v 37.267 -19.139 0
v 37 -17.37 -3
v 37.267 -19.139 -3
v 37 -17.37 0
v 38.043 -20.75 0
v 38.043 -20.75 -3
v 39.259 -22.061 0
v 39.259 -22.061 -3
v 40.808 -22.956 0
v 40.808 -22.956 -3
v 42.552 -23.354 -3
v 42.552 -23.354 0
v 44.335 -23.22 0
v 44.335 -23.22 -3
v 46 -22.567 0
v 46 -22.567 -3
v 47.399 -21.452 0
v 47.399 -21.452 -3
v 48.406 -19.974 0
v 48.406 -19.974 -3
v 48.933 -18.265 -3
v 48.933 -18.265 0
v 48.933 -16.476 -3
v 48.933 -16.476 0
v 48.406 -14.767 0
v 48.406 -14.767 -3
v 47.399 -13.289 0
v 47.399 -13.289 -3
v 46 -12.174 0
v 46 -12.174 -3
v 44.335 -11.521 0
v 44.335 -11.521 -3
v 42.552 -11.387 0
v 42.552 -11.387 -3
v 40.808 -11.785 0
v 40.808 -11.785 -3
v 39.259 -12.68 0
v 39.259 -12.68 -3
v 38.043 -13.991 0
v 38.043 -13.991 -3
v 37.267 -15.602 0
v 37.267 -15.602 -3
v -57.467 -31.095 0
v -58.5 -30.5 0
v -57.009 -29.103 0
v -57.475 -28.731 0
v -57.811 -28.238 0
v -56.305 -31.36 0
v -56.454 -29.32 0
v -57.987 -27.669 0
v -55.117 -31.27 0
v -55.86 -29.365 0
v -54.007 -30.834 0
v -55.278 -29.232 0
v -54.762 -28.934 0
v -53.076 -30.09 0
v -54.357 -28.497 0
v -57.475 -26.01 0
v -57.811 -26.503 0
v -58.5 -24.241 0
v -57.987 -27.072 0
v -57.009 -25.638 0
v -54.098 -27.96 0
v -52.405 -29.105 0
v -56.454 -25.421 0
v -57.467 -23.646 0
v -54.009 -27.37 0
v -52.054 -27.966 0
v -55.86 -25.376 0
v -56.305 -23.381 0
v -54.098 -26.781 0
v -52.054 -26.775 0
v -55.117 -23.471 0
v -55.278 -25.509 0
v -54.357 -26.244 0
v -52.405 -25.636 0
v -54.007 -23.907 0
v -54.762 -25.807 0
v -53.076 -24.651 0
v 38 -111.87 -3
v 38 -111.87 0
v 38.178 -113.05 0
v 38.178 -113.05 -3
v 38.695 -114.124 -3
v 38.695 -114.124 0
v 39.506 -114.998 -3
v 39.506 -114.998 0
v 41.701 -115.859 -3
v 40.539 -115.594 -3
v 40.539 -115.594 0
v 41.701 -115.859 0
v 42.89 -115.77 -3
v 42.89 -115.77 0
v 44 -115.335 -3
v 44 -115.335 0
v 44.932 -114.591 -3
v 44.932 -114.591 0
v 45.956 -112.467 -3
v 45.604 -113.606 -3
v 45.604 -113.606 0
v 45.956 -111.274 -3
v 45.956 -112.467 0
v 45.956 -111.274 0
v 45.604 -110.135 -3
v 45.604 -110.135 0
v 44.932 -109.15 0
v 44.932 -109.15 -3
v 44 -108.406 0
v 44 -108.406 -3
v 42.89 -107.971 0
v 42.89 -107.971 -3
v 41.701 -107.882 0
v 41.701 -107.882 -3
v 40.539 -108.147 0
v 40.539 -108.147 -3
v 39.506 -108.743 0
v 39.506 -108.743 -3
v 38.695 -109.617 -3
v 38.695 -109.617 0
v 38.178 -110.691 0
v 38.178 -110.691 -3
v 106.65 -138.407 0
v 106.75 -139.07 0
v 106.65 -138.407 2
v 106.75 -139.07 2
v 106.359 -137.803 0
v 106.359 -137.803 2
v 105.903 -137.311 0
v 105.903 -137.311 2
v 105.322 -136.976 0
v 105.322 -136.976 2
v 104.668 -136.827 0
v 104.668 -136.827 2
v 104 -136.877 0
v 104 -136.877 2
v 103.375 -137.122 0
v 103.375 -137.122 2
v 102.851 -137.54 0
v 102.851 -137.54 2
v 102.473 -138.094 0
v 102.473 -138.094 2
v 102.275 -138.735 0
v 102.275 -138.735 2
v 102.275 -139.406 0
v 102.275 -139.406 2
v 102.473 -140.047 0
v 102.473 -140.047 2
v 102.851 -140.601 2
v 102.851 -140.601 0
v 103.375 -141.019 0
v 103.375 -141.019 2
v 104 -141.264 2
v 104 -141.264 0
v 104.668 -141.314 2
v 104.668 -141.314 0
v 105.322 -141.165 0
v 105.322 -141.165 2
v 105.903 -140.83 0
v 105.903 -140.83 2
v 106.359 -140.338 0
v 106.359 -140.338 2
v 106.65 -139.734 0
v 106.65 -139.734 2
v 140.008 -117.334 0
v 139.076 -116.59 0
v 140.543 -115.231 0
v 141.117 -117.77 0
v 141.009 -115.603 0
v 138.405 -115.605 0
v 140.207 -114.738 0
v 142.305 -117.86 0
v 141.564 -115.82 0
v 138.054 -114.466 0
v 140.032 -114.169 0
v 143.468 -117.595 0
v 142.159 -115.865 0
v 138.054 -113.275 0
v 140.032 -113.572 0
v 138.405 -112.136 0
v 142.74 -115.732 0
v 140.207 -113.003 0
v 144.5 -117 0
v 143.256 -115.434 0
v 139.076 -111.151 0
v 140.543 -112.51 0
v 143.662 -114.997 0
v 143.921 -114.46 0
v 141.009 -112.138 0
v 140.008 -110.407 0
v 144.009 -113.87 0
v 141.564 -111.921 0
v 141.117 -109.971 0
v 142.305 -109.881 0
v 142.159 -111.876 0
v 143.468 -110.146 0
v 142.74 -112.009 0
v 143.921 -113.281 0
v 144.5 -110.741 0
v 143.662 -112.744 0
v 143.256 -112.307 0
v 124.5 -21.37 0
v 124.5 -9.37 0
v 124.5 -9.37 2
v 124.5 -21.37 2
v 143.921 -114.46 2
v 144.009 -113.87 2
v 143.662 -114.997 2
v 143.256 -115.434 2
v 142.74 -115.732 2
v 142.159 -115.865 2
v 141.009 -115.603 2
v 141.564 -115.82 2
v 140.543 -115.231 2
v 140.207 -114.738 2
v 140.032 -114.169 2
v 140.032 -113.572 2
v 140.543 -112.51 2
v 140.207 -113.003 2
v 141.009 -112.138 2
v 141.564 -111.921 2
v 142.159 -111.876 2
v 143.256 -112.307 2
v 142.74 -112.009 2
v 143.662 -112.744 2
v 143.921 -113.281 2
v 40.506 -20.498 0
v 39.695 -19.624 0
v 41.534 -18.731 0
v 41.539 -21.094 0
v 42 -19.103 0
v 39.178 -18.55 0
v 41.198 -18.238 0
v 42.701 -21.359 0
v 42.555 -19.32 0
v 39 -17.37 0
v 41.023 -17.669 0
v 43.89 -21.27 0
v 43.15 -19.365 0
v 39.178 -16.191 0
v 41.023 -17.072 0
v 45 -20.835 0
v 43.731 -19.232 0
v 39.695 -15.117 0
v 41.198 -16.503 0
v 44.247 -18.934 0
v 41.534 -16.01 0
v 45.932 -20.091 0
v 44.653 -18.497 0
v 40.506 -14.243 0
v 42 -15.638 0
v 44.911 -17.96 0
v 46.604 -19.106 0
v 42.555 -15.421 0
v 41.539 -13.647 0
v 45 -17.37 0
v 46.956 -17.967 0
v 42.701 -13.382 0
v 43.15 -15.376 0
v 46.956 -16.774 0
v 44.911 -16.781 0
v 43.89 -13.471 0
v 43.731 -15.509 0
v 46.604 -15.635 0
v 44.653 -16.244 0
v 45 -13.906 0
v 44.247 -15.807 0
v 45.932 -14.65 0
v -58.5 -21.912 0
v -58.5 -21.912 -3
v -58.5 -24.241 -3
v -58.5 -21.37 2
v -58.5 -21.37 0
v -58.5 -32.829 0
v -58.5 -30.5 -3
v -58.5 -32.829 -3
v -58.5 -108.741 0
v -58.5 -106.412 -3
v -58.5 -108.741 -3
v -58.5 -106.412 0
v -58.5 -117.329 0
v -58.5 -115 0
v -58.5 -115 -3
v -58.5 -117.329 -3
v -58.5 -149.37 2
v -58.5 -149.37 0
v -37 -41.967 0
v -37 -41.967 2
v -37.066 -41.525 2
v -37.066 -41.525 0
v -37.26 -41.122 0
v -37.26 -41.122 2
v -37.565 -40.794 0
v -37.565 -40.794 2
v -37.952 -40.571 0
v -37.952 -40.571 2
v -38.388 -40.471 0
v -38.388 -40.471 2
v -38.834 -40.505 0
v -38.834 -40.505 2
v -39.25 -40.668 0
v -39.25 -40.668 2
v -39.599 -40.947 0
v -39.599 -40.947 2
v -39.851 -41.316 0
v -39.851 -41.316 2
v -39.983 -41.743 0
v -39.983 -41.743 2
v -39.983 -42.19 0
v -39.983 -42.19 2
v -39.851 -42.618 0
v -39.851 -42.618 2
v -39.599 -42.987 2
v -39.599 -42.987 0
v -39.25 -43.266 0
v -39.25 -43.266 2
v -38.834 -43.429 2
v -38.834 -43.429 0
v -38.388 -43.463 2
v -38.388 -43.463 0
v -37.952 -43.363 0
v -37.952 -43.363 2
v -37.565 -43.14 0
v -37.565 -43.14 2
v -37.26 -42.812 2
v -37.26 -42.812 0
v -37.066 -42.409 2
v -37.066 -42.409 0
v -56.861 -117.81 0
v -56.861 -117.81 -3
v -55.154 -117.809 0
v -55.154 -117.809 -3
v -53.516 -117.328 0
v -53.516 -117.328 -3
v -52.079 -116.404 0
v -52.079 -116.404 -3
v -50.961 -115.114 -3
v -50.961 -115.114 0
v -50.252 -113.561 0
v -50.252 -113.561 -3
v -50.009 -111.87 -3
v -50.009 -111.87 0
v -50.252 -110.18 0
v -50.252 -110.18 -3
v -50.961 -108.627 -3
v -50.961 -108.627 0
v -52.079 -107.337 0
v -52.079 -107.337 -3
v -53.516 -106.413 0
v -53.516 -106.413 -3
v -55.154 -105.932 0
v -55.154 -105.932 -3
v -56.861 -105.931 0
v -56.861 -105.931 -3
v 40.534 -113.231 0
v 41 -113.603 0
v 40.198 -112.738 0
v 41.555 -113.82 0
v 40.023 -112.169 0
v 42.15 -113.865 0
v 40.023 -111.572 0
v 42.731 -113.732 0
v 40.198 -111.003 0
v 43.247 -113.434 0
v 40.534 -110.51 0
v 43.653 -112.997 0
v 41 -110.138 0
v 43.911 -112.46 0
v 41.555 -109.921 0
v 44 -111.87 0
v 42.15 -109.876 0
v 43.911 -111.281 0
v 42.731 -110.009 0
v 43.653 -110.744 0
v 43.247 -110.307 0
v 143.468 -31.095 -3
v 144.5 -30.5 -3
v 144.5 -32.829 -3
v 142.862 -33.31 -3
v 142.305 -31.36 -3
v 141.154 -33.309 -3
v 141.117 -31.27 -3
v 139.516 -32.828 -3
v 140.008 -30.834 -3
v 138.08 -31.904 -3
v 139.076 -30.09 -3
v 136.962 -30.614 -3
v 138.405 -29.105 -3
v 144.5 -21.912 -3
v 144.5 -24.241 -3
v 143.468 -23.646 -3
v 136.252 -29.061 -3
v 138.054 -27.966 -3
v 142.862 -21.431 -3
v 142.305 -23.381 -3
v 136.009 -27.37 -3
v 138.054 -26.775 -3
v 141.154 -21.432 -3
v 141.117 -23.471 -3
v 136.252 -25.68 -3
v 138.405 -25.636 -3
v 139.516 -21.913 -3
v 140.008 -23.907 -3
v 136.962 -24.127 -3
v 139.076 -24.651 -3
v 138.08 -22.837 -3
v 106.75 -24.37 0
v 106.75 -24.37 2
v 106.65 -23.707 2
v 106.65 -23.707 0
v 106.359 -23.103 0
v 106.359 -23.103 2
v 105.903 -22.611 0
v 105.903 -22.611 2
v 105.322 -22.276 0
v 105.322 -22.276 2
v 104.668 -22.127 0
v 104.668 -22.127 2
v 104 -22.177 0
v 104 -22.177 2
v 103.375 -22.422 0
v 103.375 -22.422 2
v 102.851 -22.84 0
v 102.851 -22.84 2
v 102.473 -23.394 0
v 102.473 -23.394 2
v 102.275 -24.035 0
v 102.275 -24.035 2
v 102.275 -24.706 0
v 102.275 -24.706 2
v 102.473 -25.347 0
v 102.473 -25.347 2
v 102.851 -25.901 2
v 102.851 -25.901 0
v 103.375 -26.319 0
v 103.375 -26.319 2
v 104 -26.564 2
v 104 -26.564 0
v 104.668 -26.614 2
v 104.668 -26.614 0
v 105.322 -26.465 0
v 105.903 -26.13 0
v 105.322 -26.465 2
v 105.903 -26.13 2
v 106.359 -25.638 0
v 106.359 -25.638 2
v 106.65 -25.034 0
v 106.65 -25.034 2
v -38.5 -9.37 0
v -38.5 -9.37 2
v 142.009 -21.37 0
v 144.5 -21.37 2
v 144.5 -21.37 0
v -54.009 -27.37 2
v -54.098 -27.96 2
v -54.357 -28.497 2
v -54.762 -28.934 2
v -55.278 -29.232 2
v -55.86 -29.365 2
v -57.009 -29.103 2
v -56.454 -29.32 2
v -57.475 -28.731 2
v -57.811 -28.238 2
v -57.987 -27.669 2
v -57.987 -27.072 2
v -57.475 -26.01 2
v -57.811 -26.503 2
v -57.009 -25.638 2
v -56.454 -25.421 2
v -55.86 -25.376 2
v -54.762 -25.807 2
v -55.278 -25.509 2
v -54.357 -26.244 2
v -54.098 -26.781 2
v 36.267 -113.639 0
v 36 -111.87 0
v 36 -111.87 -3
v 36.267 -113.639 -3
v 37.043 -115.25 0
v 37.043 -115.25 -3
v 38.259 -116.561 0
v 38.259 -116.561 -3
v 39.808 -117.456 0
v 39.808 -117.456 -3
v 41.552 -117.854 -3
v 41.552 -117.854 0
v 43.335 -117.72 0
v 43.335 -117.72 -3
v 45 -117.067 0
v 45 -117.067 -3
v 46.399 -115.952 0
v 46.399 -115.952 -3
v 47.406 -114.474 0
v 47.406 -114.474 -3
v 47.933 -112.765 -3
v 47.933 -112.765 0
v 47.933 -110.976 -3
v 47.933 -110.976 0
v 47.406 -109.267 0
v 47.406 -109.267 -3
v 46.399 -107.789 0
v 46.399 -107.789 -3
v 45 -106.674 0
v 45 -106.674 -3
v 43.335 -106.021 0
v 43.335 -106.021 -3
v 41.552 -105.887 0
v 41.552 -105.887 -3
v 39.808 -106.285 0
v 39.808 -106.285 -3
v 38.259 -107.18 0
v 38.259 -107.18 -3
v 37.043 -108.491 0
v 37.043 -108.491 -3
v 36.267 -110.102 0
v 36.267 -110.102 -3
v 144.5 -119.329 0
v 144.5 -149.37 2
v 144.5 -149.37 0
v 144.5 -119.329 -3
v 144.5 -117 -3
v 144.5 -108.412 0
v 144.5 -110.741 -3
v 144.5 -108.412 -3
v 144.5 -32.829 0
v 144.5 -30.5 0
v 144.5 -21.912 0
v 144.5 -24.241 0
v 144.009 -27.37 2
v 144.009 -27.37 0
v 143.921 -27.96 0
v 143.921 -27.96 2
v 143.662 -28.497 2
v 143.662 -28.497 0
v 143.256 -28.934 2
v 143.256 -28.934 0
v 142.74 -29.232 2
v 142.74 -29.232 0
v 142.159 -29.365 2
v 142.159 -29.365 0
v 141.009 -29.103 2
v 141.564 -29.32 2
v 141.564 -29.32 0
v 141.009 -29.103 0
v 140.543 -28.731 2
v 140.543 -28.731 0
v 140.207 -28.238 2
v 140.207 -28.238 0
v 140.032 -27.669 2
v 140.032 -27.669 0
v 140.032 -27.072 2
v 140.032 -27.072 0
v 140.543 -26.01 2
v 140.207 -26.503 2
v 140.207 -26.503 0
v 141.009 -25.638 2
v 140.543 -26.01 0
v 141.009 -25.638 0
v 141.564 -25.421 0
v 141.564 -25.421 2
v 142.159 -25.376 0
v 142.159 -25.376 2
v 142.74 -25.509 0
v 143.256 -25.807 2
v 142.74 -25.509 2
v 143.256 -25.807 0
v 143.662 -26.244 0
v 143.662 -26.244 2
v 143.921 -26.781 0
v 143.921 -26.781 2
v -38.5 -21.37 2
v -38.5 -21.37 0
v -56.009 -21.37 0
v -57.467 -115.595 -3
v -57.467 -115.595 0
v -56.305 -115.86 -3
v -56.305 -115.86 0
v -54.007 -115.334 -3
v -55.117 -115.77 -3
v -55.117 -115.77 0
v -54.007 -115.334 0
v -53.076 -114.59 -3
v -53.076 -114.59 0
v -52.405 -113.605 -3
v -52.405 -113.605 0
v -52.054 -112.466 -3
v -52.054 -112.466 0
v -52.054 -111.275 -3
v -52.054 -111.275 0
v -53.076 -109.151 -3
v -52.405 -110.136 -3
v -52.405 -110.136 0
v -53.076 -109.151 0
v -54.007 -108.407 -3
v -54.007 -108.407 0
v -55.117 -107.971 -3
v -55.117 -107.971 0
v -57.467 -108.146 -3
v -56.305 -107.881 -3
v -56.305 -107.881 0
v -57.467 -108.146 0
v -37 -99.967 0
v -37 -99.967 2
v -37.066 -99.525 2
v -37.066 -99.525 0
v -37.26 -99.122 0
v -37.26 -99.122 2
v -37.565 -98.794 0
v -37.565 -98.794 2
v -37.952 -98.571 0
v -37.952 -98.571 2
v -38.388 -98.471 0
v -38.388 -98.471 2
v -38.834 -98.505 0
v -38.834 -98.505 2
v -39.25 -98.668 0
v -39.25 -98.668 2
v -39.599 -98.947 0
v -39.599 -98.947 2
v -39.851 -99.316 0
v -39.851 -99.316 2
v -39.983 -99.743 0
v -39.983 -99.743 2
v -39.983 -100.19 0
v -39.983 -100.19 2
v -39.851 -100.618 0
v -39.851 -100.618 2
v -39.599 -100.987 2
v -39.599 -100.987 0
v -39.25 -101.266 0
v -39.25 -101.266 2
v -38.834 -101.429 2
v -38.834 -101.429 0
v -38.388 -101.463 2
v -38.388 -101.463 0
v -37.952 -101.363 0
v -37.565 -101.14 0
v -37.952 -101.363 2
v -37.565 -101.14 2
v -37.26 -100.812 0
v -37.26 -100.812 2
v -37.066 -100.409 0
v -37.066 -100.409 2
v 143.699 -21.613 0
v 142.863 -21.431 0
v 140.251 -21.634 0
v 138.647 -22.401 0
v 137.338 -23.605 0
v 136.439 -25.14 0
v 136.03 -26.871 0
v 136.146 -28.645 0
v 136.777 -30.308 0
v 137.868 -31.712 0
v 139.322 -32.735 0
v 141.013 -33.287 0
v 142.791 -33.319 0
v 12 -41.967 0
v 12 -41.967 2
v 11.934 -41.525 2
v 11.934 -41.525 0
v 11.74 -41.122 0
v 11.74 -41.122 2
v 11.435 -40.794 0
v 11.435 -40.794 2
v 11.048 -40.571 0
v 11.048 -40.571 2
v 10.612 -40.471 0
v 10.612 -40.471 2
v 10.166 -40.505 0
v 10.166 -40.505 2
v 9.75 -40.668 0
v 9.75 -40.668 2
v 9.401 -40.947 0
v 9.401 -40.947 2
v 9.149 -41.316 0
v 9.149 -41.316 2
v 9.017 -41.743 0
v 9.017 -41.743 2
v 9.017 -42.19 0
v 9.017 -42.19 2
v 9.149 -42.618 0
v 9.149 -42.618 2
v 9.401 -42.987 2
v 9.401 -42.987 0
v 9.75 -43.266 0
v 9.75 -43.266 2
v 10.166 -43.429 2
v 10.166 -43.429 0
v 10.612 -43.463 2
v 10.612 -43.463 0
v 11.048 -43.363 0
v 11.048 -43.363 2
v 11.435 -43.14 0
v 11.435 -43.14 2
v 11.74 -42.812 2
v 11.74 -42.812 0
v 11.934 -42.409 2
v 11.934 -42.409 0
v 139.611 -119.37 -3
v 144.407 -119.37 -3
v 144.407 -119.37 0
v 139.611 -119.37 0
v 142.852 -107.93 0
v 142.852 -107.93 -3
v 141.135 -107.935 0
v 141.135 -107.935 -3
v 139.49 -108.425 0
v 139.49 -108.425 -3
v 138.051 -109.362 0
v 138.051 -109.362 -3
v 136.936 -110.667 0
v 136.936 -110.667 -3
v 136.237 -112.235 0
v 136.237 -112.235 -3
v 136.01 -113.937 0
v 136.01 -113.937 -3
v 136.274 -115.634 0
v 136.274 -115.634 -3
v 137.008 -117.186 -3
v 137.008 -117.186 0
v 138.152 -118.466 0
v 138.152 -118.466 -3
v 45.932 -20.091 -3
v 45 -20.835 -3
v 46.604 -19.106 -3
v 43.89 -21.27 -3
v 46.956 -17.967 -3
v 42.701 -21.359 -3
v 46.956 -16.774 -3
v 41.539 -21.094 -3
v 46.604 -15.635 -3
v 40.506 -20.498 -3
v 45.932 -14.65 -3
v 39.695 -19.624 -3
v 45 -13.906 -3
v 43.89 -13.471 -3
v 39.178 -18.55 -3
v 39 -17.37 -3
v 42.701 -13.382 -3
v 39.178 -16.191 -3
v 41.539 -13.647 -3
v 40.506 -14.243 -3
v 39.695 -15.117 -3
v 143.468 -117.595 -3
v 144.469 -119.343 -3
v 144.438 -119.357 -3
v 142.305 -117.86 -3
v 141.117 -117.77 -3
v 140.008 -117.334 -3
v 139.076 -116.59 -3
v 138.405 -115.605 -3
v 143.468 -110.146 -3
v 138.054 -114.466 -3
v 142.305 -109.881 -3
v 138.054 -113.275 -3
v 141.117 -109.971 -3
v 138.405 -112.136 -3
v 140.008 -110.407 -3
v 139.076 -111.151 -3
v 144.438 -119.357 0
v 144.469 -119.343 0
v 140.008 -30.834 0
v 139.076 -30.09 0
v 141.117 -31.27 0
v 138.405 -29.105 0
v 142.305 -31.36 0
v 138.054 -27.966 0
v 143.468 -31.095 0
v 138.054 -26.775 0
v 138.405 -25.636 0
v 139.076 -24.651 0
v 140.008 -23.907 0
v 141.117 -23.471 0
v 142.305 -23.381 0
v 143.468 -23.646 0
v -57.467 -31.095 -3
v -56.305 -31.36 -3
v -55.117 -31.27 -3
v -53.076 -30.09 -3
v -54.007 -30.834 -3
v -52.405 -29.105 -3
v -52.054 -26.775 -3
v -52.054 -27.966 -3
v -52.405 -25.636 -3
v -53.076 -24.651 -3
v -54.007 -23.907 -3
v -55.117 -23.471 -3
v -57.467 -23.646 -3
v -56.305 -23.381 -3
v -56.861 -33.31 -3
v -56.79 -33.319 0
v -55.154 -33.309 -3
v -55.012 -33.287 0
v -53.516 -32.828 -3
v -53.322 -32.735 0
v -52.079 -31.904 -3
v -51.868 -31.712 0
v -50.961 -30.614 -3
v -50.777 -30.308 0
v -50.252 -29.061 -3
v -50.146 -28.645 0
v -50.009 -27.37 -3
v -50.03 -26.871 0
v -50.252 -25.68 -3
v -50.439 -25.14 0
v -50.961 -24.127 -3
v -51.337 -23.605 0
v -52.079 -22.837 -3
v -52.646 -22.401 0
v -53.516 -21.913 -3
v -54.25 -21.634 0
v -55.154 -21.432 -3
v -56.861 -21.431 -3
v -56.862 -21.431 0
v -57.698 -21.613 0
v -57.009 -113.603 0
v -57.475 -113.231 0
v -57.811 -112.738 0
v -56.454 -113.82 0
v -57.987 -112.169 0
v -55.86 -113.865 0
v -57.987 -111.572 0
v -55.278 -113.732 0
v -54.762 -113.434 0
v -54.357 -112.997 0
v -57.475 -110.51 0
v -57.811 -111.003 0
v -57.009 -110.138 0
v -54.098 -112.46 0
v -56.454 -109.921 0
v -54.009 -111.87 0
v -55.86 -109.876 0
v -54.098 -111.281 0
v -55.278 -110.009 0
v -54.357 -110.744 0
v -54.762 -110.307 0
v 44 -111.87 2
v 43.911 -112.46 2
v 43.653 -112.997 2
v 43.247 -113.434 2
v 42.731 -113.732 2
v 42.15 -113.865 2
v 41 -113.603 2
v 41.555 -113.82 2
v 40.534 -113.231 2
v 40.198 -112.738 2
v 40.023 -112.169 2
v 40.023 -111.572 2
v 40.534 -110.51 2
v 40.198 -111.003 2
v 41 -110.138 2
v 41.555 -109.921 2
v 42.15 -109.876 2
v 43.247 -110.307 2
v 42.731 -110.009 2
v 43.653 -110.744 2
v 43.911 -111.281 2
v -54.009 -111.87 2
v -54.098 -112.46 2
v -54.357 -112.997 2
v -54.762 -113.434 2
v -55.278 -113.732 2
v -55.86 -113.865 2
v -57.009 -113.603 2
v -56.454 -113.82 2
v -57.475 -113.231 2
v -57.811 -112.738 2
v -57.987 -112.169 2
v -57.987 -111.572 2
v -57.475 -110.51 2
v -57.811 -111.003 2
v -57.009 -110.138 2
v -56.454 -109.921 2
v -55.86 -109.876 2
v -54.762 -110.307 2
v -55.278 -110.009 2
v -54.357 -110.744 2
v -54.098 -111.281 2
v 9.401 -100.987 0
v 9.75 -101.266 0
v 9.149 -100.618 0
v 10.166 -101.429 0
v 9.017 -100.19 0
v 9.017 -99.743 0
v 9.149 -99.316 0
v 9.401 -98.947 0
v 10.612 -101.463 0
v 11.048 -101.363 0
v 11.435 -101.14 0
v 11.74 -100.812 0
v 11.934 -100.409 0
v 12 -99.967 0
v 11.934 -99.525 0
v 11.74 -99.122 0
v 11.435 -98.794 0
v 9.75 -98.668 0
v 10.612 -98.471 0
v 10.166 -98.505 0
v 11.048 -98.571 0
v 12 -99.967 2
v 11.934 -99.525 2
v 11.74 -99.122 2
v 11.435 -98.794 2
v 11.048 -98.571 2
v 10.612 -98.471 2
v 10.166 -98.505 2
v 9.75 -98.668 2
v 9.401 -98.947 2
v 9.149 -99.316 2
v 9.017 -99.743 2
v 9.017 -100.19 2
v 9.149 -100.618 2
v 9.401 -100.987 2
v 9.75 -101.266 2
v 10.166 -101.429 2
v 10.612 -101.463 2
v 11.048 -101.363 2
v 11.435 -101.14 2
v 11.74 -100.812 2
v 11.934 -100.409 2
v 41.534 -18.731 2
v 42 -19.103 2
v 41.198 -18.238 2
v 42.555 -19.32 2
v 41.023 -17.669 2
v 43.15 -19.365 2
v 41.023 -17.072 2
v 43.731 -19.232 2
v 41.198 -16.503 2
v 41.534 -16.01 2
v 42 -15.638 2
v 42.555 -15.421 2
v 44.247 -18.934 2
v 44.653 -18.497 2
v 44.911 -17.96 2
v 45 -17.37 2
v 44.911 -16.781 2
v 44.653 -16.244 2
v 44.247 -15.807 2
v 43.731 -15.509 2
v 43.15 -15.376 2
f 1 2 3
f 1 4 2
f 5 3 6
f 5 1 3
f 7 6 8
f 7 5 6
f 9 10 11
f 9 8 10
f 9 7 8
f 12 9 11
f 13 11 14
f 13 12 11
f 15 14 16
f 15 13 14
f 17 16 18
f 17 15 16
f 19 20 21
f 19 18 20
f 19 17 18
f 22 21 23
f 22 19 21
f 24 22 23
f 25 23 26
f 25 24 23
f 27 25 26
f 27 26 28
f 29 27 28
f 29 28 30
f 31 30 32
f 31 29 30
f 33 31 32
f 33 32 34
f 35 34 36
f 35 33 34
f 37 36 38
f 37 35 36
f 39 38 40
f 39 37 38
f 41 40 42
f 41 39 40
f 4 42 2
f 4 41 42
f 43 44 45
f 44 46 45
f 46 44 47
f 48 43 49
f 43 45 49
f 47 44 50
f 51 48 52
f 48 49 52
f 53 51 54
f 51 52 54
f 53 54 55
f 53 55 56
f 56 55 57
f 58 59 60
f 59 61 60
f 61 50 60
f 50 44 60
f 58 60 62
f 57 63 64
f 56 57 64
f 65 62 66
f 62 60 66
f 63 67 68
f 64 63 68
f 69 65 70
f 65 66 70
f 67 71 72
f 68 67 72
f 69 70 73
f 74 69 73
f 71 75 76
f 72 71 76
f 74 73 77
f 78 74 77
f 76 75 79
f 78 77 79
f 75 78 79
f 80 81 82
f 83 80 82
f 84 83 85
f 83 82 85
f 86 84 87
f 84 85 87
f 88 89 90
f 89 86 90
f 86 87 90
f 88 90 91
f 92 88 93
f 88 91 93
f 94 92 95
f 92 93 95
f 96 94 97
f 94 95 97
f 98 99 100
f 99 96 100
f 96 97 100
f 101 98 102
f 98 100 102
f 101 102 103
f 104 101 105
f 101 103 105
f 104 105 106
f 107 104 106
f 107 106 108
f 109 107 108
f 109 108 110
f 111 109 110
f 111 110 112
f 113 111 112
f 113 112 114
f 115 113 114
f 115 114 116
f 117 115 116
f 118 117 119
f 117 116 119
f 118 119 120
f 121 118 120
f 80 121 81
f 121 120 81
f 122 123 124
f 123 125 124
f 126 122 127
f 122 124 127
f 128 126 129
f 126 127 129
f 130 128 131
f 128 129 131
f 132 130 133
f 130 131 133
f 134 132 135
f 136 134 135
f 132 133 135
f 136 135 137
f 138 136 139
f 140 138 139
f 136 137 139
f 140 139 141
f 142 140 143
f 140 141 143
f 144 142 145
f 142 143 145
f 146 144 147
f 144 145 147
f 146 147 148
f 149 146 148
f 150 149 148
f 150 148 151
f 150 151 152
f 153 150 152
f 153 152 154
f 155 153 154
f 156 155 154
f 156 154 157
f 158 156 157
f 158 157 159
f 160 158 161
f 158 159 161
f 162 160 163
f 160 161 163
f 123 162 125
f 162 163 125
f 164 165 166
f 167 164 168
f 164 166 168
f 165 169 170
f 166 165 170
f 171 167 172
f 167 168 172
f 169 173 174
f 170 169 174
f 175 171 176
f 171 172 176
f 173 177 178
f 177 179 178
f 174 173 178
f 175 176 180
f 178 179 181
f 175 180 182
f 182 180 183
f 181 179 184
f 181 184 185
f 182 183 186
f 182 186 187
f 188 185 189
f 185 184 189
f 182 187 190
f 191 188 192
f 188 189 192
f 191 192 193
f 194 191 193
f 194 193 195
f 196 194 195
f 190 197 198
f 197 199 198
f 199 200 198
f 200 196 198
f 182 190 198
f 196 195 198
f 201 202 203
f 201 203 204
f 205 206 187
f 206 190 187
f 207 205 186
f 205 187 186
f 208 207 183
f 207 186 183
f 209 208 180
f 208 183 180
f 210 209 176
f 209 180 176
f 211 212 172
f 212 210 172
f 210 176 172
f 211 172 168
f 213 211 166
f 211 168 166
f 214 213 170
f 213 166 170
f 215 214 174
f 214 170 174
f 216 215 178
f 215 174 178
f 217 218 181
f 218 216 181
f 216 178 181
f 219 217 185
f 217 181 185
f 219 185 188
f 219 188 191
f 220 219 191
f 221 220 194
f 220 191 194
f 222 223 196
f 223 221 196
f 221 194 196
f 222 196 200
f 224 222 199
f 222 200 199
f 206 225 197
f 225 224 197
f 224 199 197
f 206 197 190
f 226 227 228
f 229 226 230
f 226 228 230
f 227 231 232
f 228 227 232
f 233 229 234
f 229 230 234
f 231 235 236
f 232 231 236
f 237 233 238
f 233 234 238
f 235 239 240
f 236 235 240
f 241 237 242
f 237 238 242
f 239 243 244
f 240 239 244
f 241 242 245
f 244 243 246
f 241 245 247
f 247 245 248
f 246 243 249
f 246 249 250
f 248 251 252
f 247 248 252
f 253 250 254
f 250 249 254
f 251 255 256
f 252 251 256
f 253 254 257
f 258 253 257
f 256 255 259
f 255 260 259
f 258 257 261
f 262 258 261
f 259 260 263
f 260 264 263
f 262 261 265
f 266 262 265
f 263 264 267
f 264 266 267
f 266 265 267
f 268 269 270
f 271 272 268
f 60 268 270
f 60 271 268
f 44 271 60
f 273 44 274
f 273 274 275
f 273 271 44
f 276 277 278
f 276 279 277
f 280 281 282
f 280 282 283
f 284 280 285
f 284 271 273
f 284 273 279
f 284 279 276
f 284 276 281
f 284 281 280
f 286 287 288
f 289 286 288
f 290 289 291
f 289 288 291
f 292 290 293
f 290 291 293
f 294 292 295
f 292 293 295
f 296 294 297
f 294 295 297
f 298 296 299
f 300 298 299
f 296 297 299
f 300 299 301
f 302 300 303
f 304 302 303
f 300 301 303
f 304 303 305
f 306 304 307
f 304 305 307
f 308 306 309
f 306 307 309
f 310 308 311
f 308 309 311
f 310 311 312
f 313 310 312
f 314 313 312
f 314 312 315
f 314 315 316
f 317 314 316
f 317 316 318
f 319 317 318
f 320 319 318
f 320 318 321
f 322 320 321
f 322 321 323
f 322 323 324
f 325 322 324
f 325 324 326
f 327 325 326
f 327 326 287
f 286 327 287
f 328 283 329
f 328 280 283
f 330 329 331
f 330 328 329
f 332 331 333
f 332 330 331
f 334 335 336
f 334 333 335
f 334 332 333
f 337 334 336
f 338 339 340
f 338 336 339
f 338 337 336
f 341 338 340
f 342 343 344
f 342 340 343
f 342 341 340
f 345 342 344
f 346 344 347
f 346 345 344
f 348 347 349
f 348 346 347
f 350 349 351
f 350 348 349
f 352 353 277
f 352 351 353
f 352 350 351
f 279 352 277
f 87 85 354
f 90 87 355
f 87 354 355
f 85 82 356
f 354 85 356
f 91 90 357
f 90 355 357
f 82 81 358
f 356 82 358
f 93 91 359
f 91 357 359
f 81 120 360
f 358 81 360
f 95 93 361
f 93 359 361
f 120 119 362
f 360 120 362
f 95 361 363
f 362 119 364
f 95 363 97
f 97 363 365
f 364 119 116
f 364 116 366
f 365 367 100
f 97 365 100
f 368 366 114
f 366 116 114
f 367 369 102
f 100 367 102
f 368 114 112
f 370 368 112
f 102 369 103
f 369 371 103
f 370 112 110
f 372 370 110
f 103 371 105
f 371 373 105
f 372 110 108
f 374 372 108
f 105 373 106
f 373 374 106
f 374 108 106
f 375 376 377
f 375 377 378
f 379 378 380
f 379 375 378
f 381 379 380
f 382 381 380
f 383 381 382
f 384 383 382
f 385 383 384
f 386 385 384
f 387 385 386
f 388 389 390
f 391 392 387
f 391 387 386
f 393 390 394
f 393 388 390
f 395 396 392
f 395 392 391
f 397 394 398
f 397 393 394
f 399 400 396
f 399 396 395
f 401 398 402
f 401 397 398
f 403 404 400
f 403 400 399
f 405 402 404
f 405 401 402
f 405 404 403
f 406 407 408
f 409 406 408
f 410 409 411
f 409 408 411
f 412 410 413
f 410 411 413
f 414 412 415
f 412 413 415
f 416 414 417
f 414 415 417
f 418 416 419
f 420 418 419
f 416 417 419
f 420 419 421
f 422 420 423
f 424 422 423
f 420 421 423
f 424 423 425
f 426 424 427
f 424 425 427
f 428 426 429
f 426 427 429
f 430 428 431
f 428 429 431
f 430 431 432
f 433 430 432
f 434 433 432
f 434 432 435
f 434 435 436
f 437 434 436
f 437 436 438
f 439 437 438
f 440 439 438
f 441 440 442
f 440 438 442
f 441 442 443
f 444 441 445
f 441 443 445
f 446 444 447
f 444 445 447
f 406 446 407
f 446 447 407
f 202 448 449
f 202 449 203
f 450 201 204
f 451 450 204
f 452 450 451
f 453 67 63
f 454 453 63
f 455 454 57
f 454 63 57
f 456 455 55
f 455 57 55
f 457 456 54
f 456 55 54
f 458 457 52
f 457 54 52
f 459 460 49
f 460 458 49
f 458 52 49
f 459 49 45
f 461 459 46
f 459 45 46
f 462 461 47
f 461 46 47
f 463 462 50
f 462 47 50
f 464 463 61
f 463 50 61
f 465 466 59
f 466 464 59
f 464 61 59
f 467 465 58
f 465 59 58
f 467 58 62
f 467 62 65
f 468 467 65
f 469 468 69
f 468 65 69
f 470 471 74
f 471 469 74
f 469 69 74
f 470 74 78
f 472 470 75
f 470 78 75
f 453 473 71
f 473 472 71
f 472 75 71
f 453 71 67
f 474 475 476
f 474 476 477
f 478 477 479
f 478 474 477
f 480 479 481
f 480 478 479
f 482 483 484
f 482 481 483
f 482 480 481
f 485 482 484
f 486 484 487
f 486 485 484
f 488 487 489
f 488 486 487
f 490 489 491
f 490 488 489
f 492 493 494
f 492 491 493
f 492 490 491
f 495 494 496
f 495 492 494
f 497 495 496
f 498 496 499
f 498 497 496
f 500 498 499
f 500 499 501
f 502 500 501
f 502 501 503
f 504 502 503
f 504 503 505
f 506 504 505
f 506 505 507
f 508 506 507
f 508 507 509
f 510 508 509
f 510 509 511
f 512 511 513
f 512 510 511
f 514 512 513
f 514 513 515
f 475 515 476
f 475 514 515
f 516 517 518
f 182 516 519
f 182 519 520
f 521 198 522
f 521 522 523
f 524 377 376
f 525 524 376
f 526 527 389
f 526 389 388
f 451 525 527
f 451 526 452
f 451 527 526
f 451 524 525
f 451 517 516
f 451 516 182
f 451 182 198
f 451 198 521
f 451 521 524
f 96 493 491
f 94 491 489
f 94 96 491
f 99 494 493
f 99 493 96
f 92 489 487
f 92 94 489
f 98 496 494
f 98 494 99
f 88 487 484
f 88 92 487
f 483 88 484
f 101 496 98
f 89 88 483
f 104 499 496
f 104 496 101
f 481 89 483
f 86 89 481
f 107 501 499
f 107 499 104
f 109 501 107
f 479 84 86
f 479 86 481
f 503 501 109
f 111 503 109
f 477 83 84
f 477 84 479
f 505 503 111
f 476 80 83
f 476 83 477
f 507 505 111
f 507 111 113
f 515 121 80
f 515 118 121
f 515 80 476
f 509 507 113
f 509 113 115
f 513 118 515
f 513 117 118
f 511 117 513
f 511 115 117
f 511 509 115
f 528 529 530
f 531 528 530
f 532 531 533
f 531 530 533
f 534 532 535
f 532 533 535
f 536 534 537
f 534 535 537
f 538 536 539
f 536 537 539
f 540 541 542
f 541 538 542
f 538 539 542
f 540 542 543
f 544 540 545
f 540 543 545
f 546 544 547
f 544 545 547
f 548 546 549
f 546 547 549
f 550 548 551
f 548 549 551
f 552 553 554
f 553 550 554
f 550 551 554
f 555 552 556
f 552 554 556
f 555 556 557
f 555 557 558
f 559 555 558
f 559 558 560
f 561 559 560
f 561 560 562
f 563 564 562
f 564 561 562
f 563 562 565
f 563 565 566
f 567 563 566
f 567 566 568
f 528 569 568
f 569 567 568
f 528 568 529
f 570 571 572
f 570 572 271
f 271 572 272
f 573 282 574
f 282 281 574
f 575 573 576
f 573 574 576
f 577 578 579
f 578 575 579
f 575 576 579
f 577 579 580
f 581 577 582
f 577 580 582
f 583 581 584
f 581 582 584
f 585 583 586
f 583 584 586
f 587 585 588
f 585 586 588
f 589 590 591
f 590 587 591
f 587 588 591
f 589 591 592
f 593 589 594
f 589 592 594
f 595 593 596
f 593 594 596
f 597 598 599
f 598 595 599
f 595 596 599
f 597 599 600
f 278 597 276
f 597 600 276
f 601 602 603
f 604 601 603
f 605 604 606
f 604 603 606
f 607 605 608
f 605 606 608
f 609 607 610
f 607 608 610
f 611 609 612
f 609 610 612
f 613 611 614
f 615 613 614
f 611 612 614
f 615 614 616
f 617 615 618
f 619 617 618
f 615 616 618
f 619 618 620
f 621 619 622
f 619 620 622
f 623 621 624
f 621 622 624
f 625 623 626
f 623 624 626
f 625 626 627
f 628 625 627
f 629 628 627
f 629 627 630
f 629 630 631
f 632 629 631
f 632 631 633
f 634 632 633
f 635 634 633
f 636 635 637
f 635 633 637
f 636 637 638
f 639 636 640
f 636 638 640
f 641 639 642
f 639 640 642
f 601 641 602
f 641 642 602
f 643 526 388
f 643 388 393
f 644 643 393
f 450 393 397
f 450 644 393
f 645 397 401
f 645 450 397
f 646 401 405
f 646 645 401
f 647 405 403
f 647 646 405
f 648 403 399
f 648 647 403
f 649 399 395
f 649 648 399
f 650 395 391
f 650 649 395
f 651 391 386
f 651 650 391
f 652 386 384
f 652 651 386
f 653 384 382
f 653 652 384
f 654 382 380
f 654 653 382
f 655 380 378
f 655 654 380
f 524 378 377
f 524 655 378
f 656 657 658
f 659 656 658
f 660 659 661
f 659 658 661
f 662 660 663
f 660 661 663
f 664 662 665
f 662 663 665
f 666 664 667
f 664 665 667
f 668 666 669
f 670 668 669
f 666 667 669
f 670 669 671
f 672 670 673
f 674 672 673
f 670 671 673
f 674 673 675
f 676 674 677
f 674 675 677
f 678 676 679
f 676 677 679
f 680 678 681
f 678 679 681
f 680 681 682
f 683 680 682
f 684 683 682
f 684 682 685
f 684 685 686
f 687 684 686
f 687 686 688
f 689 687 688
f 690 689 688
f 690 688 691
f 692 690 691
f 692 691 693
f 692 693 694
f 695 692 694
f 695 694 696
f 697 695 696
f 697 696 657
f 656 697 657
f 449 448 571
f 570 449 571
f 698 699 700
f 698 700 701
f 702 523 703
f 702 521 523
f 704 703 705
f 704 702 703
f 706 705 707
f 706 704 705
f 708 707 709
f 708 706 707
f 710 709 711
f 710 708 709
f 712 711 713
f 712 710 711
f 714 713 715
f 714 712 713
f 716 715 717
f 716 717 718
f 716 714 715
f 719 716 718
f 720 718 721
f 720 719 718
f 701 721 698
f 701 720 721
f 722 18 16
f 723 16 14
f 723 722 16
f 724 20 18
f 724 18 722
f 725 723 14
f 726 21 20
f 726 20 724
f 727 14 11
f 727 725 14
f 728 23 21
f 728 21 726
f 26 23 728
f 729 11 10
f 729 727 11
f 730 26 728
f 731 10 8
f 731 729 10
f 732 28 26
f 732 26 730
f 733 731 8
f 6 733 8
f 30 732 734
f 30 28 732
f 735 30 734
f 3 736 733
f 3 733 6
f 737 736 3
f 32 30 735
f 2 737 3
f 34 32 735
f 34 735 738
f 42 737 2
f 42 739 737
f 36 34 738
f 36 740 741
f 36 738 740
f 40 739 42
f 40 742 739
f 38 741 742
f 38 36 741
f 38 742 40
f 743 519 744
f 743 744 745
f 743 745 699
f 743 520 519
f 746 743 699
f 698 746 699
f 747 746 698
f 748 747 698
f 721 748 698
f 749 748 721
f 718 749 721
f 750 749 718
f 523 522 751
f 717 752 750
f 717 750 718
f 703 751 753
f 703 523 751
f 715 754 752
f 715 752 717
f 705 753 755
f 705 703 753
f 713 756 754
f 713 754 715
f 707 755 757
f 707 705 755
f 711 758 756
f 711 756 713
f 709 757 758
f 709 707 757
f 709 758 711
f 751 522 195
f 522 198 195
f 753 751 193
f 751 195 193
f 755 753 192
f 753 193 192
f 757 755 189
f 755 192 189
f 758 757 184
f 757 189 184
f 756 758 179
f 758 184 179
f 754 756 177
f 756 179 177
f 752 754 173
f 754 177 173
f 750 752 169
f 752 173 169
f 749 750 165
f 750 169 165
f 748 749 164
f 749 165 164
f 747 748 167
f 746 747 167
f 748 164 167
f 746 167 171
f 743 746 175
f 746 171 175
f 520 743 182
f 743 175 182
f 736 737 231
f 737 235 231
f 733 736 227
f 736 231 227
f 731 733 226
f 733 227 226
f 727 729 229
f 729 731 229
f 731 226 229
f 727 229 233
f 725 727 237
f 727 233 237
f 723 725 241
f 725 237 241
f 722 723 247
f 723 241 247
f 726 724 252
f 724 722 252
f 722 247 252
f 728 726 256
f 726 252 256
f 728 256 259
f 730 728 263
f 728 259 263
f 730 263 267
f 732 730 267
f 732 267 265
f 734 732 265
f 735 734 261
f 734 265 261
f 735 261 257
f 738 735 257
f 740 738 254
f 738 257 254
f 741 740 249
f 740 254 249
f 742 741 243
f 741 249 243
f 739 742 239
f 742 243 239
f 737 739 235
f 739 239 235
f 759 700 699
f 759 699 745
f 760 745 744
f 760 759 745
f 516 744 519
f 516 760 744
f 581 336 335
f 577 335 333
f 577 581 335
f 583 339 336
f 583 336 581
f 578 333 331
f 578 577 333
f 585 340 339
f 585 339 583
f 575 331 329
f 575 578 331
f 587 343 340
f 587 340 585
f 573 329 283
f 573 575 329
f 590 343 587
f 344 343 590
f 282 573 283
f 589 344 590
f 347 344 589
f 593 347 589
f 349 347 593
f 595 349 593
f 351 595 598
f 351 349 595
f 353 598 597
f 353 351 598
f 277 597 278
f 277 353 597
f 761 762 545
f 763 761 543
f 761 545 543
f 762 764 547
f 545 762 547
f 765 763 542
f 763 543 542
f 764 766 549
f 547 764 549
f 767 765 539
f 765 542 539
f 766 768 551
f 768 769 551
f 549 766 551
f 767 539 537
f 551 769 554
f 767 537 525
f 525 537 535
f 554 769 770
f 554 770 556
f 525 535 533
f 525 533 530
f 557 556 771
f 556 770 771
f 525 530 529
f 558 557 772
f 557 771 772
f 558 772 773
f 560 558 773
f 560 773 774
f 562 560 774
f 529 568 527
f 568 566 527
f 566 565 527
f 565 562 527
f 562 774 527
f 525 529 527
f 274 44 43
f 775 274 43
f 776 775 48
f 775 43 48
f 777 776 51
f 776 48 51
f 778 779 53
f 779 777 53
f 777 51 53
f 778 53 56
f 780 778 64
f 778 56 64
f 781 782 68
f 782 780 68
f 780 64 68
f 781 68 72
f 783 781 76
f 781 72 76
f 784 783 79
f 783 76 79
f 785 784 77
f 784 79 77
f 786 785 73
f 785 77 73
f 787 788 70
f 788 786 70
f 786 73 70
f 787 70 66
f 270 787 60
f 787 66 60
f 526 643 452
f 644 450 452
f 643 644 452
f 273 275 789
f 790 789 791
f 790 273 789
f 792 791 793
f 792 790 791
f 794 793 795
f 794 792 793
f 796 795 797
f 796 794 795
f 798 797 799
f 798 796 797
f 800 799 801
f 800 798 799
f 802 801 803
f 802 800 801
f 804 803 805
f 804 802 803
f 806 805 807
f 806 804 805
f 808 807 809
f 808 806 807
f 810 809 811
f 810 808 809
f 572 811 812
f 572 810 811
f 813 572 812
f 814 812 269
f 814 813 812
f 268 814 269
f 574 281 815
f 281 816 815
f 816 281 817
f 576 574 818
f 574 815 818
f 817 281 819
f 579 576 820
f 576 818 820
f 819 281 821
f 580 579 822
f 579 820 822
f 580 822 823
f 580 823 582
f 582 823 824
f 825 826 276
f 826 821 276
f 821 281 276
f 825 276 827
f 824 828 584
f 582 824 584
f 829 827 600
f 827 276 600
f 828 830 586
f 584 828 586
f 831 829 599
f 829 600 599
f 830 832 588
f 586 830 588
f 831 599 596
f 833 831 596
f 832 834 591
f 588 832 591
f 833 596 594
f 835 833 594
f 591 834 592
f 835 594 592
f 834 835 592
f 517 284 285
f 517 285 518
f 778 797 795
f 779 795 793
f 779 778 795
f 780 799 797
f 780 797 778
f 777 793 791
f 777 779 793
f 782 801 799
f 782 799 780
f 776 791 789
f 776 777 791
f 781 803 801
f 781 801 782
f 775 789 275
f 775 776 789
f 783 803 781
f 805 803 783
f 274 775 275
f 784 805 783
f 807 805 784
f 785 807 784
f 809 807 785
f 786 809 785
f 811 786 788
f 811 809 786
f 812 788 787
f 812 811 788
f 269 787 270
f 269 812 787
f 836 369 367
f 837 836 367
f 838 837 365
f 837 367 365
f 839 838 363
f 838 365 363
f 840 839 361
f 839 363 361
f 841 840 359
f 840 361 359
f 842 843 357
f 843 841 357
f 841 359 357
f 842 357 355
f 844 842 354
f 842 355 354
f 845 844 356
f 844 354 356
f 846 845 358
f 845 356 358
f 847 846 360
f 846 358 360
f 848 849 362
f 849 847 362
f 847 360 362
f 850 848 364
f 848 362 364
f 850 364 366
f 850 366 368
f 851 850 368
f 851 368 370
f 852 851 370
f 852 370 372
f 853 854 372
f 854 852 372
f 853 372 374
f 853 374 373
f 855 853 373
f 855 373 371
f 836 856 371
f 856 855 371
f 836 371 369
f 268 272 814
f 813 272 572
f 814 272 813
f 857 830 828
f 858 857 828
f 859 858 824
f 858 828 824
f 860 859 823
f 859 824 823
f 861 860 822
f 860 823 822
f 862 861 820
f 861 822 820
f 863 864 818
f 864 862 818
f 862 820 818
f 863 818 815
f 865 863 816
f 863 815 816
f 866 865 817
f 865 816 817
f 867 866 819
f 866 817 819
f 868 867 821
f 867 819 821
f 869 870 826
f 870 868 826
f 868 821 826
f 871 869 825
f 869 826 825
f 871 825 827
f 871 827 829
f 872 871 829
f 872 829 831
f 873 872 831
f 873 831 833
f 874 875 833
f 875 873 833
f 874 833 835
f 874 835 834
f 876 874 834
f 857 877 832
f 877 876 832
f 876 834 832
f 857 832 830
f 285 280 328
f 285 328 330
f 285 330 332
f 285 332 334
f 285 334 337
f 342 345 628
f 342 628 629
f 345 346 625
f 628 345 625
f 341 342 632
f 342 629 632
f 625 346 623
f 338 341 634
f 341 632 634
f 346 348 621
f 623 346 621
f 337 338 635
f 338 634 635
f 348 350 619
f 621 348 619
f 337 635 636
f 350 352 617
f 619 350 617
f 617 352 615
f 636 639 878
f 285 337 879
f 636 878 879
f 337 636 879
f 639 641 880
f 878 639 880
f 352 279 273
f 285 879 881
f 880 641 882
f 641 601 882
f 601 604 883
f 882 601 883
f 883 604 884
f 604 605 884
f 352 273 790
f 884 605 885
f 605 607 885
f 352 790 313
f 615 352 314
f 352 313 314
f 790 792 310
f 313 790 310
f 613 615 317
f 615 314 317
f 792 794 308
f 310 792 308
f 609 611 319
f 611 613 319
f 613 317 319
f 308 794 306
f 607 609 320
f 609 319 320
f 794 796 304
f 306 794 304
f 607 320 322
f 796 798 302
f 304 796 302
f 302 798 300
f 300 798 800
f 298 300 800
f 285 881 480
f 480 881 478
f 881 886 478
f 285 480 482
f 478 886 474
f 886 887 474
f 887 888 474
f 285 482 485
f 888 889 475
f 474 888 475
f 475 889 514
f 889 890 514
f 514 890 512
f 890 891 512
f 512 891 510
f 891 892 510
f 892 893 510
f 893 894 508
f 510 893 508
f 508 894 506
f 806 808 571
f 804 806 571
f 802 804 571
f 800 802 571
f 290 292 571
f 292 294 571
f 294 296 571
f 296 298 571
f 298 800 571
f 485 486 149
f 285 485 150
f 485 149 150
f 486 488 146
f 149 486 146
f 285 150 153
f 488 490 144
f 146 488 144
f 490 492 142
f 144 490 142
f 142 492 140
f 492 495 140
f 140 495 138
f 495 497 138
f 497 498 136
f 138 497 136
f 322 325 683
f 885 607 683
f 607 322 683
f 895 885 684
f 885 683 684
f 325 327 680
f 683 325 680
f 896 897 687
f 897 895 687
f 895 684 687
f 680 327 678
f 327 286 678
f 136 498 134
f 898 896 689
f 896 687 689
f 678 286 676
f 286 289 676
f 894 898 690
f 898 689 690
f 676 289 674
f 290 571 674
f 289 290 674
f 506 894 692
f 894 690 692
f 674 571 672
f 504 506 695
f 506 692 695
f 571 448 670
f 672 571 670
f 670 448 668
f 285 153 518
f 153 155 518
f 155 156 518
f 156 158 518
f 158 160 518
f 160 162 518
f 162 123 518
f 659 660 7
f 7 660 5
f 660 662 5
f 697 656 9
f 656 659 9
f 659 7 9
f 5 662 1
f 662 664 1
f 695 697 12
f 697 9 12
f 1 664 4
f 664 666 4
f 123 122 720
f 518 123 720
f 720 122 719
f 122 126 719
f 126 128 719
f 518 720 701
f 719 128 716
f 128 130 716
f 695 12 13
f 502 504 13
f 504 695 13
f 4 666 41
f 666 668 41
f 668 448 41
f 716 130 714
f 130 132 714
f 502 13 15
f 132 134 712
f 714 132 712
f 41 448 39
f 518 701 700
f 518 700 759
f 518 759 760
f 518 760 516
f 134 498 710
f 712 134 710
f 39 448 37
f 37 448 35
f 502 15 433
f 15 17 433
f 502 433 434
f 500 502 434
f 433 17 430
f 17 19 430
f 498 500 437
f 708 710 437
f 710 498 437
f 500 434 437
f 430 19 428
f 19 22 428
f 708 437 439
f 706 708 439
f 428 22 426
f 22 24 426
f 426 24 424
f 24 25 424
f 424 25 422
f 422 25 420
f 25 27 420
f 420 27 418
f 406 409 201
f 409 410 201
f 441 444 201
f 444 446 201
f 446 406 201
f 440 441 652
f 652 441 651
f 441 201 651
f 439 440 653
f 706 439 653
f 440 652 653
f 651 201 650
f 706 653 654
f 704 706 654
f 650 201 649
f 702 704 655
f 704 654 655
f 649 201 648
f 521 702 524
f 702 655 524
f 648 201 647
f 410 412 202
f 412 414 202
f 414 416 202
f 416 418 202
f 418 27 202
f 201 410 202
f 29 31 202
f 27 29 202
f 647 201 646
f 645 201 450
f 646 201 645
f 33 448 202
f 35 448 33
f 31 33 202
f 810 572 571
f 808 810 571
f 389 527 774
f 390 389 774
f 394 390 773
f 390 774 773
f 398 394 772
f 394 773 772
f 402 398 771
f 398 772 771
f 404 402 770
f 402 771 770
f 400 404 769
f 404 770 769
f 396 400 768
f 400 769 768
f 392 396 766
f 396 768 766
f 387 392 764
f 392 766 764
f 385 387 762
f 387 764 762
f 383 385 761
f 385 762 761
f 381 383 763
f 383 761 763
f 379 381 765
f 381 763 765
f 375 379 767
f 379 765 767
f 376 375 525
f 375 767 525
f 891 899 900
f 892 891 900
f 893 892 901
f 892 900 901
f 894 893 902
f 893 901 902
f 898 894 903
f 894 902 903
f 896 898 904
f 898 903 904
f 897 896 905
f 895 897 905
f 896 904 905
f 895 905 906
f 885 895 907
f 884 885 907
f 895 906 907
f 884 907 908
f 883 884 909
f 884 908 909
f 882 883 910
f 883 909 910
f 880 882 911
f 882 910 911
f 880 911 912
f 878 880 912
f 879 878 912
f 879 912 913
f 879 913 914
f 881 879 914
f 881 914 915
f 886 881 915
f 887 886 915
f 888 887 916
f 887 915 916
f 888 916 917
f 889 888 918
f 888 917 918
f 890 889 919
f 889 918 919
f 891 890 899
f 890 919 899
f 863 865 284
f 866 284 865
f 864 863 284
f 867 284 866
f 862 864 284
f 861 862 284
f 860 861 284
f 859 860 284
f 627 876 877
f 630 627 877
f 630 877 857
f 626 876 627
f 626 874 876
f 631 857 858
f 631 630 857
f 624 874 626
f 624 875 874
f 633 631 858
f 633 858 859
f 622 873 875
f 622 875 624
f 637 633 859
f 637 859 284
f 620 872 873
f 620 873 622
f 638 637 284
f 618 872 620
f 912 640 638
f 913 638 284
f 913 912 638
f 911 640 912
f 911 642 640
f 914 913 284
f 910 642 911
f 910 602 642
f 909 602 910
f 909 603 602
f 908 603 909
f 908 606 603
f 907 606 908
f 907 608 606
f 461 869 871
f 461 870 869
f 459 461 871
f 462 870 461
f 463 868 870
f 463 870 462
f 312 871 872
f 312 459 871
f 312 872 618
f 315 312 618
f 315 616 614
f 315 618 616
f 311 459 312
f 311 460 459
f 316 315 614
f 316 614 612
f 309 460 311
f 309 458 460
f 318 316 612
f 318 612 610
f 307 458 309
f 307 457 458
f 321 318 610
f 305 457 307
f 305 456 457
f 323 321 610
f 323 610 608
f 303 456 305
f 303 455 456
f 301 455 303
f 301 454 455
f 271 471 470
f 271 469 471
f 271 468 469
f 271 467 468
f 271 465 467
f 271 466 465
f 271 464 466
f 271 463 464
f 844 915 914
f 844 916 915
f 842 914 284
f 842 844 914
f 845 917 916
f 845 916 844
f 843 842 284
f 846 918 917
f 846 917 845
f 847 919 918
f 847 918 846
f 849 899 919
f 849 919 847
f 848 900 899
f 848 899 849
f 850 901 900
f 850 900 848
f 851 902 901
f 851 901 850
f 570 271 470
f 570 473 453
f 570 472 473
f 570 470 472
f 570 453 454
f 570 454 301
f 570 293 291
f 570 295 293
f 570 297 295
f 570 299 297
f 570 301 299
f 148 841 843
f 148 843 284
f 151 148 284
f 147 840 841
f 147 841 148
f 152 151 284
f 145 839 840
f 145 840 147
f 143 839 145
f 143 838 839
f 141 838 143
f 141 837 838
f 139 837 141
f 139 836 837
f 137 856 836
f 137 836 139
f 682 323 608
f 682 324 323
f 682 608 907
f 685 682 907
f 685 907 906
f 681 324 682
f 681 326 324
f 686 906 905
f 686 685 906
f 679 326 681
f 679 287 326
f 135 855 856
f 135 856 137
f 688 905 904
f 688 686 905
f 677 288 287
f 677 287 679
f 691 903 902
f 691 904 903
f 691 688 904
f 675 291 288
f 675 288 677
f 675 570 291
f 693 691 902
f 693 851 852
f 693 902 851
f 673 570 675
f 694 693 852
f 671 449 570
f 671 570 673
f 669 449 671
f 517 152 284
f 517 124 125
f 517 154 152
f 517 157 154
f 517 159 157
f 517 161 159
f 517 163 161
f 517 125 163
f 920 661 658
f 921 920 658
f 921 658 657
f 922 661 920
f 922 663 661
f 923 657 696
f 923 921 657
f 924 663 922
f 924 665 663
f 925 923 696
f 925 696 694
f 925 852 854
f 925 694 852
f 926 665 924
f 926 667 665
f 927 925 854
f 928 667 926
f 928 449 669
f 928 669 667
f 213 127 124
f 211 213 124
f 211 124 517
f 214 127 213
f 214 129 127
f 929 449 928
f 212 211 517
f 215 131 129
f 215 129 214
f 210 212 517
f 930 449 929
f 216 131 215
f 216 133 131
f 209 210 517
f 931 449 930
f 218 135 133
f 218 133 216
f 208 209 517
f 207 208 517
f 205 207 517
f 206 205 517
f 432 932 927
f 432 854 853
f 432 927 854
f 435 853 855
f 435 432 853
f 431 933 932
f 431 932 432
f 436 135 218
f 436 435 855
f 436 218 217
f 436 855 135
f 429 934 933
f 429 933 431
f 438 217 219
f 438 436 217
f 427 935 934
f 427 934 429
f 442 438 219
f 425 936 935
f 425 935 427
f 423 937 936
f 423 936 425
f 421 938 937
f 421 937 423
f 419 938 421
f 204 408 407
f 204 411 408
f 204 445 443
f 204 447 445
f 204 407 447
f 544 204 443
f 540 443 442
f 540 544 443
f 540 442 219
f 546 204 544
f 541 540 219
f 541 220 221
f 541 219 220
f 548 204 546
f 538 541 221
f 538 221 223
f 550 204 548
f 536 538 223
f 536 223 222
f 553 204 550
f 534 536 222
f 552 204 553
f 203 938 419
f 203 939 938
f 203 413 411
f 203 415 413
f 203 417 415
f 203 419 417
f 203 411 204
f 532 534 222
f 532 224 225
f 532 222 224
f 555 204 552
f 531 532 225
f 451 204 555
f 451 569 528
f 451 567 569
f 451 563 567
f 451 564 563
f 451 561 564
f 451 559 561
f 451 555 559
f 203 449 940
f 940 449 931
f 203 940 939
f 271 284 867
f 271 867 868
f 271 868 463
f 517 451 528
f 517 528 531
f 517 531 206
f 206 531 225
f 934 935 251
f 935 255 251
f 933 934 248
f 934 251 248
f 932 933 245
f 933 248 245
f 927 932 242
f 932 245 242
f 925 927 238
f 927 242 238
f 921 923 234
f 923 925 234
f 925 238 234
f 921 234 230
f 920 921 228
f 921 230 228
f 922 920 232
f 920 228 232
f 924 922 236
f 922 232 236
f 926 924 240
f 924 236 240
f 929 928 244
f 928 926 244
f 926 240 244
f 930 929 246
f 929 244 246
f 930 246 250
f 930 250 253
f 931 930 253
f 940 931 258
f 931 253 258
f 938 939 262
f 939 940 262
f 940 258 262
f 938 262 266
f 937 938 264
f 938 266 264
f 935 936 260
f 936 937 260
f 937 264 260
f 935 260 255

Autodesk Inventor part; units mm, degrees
ref_plane "YZ Plane" through (0, 0, 0) normal (1, 0, 0) x (0, 1, 0)
ref_plane "XZ Plane" through (0, 0, 0) normal (0, 1, 0) x (-1, 0, 0)
ref_plane "XY Plane" through (0, 0, 0) normal (0, 0, 1) x (1, 0, 0)
sketch "Sketch1" plane through (0, 0, 0) normal (0, 0, 1) x (1, 0, 0)
  line L0 (-58.4998, -9.3705) -> (144.5002, -9.3705)
  line L1 (144.5002, -9.3705) -> (144.5002, -119.3705)
  line L2 (144.5002, -119.3705) -> (-58.4998, -119.3705)
  line L3 (-58.4998, -119.3705) -> (-58.4998, -9.3705)
  line L4 (-58.4998, -9.3705) -> (-38.4998, -9.3705)
  line L5 (-38.4998, -9.3705) -> (-38.4998, -21.3705)
  line L6 (-38.4998, -21.3705) -> (-58.4998, -21.3705)
  line L7 (-58.4998, -21.3705) -> (-58.4998, -9.3705)
  line L8 (144.5002, -9.3705) -> (124.5002, -9.3705)
  line L9 (124.5002, -9.3705) -> (124.5002, -21.3705)
  line L10 (124.5002, -21.3705) -> (144.5002, -21.3705)
  line L11 (144.5002, -21.3705) -> (144.5002, -9.3705)
  circle A0 centre (-56.009, -27.3705) radius 2
  circle A1 centre (142.0094, -27.3705) radius 2
  circle A2 centre (43.0002, -17.3705) radius 2
  circle A3 centre (-56.009, -111.8705) radius 2
  circle A4 centre (42.0002, -111.8705) radius 2
  circle A5 centre (142.0094, -113.8705) radius 2
  point P0 (0, 0)
  dimension "d0" = 203
  dimension "d1" = 110
  dimension "d2" = 20
  dimension "d3" = 12
  dimension "d4" = 20
  dimension "d5" = 12
  dimension "d6" = 4
  dimension "d7" = 4
  dimension "d8" = 198.0184
  dimension "d9" = 2.4908
  dimension "d10" = 18
  dimension "d11" = 4
  dimension "d12" = 10
  dimension "d13" = 99.0092
  dimension "d14" = 4
  dimension "d15" = 84.5
  dimension "d16" = 4
  dimension "d17" = 4
  dimension "d18" = 0
extrude "Extrusion1" add sketch "Sketch1" along normal blind 2 contours L0 L9 L10 L1 L2 L3 L6 L5
sketch "Sketch3" plane through (0, 0, 0) normal (0, 0, -1) x (-1, 0, 0)
  circle A0 centre (56.009, -111.8705) radius 2 projected
  circle A1 centre (-42.0002, -111.8705) radius 2 projected
  circle A2 centre (-142.0094, -113.8705) radius 2 projected
  circle A3 centre (-142.0094, -27.3705) radius 2 projected
  circle A4 centre (-43.0002, -17.3705) radius 2 projected
  circle A5 centre (56.009, -27.3705) radius 2 projected
  circle A6 centre (56.009, -111.8705) radius 6
  circle A7 centre (-42.0002, -111.8705) radius 6
  circle A8 centre (-142.0094, -113.8705) radius 2 projected
  circle A9 centre (-142.0094, -113.8705) radius 6
  circle A10 centre (-43.0002, -17.3705) radius 6
  circle A11 centre (-142.0094, -27.3705) radius 6
  circle A12 centre (56.009, -27.3705) radius 6
  circle A13 centre (56.009, -111.8705) radius 4
  circle A14 centre (-42.0002, -111.8705) radius 4
  circle A15 centre (56.009, -27.3705) radius 4
  circle A16 centre (-43.0002, -17.3705) radius 4
  circle A17 centre (-142.0094, -27.3705) radius 4
  circle A18 centre (-142.0094, -113.8705) radius 4
  point P0 (0, 0)
  dimension "d45" = 12
  dimension "d46" = 12
  dimension "d47" = 12
  dimension "d48" = 12
  dimension "d49" = 12
  dimension "d50" = 12
  dimension "d51" = 8
  dimension "d52" = 8
  dimension "d53" = 8
  dimension "d54" = 8
  dimension "d55" = 8
  dimension "d56" = 8
extrude "Extrusion3" add sketch "Sketch3" along normal blind 3 contours A6 | A7 | A9 | A10 | A11 | A12
sketch "Sketch4" plane through (0, 0, 2) normal (0, 0, 1) x (1, 0, 0)
  line L0 (124.5002, -9.3705) -> (-38.4998, -9.3705) projected
  line L1 (-38.4998, -9.3705) -> (-38.4998, -21.3705) projected
  line L2 (-38.4998, -21.3705) -> (-58.4998, -21.3705) projected
  line L3 (-58.4998, -21.3705) -> (-58.4998, -119.3705) projected
  line L4 (-58.4998, -119.3705) -> (144.5002, -119.3705) projected
  line L5 (144.5002, -119.3705) -> (144.5002, -21.3705) projected
  line L6 (144.5002, -21.3705) -> (124.5002, -21.3705) projected
  line L7 (124.5002, -21.3705) -> (124.5002, -9.3705) projected
  line L8 (-77.131, 13.4165) -> (211.8208, 13.4165)
  line L9 (211.8208, 13.4165) -> (211.8208, -174.2275)
  line L10 (211.8208, -174.2275) -> (-77.131, -174.2275)
  line L11 (-77.131, -174.2275) -> (-77.131, 13.4165)
  point P0 (0, 0)
extrude "Extrusion4" cut sketch "Sketch4" against normal through all
sketch "Sketch6" plane through (0, 0, 2) normal (0, 0, 1) x (1, 0, 0)
  circle A0 centre (-38.4998, -99.9669) radius 1.5
  circle A1 centre (-38.4998, -41.9669) radius 1.5
  line L0 (-58.4998, -21.3705) -> (-58.4998, -119.3705) projected
  circle A2 centre (10.5002, -99.9669) radius 1.5
  circle A3 centre (10.5002, -41.9669) radius 1.5
  point P0 (0, 0)
  dimension "d73" = 3
  dimension "d74" = 3
  dimension "d75" = 20
  dimension "d76" = 20
  dimension "d77" = 58
  dimension "d78" = 3
  dimension "d79" = 49
  dimension "d80" = 3
extrude "Extrusion6" cut sketch "Sketch6" against normal blind 10
sketch "Sketch8" plane through (0, 0, 2) normal (0, 0, 1) x (1, 0, 0)
  line L0 (-58.4998, -119.3705) -> (144.5002, -119.3705) projected
  line L1 (144.5002, -119.3705) -> (-58.4998, -119.3705)
  line L2 (-58.4998, -119.3705) -> (-58.4998, -149.3705)
  line L3 (-58.4998, -149.3705) -> (144.5002, -149.3705)
  line L4 (144.5002, -149.3705) -> (144.5002, -119.3705)
  point P0 (0, 0)
  dimension "d86" = 30
extrude "Extrusion7" add sketch "Sketch8" against normal blind 2
sketch "Sketch9" plane through (0, 0, 2) normal (0, 0, 1) x (1, 0, 0)
  circle A0 centre (104.5002, -24.3705) radius 2.25
  circle A1 centre (104.5002, -139.0705) radius 2.25
  line L0 (124.5002, -9.3705) -> (-38.4998, -9.3705) projected
  line L1 (144.5002, -149.3705) -> (144.5002, -21.3705) projected
  point P0 (0, 0)
  dimension "d89" = 4.5
  dimension "d90" = 4.5
  dimension "d91" = 15
  dimension "d92" = 114.7
  dimension "d93" = 40
  dimension "d94" = 40
extrude "Extrusion8" cut sketch "Sketch9" against normal blind 2
equation "\"d13\" = 0.5 * d8"
properties part number "PiAndBusBarPlate"
